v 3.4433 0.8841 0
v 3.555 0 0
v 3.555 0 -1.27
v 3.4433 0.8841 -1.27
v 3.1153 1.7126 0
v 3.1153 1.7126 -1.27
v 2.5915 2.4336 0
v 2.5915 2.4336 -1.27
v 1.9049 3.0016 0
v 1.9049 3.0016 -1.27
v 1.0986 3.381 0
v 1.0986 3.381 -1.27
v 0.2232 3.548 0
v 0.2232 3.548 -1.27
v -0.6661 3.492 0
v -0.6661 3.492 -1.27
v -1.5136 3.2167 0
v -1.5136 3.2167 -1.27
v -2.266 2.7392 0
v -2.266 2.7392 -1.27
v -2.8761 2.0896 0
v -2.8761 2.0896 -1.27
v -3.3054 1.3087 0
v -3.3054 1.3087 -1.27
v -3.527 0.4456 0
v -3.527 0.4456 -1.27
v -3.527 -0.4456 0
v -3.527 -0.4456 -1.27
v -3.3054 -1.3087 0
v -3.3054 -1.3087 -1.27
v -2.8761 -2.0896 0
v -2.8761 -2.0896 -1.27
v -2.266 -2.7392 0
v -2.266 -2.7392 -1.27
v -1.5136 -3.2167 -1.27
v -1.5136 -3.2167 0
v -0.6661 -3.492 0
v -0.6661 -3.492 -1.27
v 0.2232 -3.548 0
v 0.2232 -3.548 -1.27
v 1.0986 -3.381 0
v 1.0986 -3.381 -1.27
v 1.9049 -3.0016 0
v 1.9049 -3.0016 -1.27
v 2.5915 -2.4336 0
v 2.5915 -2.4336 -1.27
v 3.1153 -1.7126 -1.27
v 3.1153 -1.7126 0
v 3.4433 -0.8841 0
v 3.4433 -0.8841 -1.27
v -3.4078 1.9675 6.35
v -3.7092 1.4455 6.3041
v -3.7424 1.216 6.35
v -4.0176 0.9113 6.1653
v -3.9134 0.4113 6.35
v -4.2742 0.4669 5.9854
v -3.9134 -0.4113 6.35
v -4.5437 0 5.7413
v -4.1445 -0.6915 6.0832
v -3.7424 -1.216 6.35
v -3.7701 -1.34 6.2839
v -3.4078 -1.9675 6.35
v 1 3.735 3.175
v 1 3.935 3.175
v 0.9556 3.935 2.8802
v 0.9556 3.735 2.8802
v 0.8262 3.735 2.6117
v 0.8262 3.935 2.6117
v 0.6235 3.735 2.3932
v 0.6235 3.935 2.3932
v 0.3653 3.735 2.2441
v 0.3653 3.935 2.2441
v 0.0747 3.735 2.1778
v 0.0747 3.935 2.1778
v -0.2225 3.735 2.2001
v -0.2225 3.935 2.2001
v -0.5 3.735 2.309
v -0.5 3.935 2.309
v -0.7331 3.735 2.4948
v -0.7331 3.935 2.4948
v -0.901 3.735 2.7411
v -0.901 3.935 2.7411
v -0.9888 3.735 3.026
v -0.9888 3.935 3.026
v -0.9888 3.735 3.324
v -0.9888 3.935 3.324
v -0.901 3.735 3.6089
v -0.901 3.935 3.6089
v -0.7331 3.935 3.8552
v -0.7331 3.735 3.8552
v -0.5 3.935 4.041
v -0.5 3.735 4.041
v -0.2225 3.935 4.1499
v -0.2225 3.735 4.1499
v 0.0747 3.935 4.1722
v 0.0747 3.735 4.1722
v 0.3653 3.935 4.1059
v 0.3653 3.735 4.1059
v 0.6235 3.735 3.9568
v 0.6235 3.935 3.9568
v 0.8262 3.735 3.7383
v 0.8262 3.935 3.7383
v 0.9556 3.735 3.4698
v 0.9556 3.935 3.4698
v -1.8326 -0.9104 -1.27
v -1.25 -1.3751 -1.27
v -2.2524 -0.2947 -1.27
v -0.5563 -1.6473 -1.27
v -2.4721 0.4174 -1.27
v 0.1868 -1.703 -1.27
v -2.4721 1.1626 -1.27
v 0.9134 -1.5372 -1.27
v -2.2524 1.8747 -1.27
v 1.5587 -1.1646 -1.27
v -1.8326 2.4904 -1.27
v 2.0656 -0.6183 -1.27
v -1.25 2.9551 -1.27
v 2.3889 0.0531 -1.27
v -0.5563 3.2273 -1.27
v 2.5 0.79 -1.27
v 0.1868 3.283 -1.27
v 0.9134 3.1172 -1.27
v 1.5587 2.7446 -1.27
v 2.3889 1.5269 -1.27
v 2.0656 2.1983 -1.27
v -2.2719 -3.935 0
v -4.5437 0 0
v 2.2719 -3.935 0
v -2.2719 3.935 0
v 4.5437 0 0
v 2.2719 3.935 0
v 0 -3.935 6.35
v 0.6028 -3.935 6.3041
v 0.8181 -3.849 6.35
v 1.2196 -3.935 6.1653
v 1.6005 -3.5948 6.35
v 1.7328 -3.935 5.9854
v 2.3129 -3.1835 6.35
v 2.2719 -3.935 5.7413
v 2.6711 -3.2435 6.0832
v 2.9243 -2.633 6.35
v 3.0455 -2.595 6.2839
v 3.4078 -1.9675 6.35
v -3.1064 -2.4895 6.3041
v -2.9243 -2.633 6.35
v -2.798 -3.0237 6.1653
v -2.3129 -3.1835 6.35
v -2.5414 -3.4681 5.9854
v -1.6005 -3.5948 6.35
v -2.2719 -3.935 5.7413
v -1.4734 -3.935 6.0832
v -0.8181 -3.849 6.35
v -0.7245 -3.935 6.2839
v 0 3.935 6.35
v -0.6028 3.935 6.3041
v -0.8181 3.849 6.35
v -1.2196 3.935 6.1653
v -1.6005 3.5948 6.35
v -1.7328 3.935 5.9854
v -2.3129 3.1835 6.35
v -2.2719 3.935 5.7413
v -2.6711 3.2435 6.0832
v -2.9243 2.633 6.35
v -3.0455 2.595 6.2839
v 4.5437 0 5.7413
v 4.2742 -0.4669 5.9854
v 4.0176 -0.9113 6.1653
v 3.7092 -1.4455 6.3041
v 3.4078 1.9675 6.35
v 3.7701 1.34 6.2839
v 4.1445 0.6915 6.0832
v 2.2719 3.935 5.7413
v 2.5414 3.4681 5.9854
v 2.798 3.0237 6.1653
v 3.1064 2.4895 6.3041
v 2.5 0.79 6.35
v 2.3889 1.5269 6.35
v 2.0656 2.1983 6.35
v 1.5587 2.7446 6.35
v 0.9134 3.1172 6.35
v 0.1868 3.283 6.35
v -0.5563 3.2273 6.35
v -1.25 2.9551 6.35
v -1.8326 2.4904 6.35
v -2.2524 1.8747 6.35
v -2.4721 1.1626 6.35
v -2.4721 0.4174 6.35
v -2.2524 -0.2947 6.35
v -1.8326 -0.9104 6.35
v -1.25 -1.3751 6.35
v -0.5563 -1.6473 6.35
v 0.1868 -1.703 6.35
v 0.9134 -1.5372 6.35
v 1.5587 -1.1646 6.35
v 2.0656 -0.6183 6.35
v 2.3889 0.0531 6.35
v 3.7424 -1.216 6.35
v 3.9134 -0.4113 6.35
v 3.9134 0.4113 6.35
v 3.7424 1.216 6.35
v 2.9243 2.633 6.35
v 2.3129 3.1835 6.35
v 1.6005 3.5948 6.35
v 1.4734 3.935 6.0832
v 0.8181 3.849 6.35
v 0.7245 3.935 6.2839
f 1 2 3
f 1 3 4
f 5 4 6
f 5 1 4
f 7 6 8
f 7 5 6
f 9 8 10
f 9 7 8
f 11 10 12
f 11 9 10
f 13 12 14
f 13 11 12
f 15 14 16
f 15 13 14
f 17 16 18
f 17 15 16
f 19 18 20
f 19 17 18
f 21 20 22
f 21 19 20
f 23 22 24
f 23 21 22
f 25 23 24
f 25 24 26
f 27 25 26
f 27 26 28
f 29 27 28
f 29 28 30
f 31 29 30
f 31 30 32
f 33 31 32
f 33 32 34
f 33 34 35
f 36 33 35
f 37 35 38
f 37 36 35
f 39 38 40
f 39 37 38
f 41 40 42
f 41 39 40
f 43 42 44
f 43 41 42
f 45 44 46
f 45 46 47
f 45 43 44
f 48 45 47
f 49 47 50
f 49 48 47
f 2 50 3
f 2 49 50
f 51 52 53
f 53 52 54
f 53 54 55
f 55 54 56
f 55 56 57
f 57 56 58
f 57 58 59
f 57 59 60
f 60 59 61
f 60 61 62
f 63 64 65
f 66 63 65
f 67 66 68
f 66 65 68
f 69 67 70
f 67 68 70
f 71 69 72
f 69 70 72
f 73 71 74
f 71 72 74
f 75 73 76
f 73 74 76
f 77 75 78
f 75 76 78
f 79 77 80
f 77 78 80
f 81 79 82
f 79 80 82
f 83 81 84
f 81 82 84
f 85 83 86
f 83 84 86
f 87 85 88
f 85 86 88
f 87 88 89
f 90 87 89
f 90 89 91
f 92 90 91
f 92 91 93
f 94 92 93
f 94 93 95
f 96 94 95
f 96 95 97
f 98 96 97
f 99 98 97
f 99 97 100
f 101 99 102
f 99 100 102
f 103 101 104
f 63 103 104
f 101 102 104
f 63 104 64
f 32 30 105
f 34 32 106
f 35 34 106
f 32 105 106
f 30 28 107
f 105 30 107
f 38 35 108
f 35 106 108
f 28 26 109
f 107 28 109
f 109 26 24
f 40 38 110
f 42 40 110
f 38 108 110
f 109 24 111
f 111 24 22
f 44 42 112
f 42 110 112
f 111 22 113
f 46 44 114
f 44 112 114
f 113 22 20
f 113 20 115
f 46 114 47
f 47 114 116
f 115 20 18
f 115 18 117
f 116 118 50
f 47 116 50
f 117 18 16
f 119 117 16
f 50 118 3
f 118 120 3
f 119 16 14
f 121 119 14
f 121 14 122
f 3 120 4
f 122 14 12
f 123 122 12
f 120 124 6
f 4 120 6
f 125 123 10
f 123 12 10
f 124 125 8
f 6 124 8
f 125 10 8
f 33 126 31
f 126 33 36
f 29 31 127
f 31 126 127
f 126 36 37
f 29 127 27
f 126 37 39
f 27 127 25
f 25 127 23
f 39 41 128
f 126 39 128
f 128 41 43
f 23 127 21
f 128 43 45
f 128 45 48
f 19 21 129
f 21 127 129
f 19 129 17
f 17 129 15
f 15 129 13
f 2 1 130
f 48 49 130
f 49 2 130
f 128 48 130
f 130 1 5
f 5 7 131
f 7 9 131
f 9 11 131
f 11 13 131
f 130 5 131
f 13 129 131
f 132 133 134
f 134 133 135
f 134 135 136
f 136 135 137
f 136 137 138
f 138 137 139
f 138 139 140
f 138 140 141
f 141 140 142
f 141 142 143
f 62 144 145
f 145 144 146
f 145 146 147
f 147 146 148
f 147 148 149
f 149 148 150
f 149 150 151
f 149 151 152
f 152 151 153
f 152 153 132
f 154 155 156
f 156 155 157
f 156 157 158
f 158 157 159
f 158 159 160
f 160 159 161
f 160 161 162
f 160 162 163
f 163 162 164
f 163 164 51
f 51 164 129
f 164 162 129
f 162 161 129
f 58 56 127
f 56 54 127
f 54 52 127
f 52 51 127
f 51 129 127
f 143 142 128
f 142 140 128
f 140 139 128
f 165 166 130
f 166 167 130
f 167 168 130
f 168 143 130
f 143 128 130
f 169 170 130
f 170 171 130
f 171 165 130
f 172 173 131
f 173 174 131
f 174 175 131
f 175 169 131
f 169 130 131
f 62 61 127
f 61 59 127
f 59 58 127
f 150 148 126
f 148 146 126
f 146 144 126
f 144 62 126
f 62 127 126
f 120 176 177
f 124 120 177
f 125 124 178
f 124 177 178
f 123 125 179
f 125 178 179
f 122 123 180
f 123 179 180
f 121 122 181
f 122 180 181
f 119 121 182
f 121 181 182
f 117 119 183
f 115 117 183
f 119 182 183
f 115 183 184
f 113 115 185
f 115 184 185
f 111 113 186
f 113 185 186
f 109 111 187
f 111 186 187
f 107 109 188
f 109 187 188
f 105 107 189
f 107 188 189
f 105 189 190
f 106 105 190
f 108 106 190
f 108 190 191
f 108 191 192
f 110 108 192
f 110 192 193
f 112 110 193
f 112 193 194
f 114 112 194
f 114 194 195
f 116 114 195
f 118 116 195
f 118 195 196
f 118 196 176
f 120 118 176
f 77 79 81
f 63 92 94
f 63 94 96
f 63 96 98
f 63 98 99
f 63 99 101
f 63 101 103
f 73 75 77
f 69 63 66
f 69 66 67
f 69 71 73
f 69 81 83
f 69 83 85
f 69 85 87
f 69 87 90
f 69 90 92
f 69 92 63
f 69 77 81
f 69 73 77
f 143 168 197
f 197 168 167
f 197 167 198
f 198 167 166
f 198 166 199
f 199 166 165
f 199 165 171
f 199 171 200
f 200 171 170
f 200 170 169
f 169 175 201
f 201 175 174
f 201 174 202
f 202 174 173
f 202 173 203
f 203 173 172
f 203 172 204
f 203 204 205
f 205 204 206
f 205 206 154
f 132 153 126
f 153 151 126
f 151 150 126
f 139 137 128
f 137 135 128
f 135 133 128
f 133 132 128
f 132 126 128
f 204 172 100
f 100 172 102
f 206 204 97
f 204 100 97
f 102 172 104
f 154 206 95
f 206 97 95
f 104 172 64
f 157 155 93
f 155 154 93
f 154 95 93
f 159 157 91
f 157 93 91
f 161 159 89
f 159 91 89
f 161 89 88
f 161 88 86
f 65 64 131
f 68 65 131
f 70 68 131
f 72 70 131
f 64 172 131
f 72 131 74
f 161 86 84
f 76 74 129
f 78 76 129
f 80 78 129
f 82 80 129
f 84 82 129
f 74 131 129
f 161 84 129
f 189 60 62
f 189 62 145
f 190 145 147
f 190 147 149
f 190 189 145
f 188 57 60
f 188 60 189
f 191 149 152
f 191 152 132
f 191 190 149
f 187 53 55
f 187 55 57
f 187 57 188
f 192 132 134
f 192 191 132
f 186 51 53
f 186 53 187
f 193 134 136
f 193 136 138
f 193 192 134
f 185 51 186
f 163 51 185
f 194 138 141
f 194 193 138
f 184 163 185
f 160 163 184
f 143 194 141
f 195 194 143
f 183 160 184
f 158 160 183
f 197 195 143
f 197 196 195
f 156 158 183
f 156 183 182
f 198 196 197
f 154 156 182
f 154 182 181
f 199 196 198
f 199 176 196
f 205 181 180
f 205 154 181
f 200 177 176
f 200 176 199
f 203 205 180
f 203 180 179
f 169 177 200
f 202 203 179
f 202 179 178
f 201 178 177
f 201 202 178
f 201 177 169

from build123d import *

# Parameters (mm, degrees)
SKETCH1_R      = 3.555
EXTRUDE1_DEPTH = 1.27
ICE1_DEPTH     = 6.35
SKETCH3_R      = 2.5
ICE2_DEPTH     = 8.62
SKETCH4_R      = 1
ICE3_DEPTH     = 0.2


with BuildPart() as part:
    # Sketch1 → Extrude1 (new body)
    with BuildSketch(Plane.XY):
        Circle(SKETCH1_R)
    extrude(amount=-EXTRUDE1_DEPTH)

    # Sketch2 → ICE1 (add)
    with BuildSketch(Plane.XY):
        Polygon((4.543746619, 0), (2.271873309, 3.935), (-2.271873309, 3.935), (-4.543746619, 0), (-2.271873309, -3.935), (2.271873309, -3.935), align=None)
    extrude(amount=ICE1_DEPTH)

    # Sketch3 → ICE2 (cut, through all)
    with BuildSketch(Plane.XY.offset(6.35)):
        with Locations((0, 0.79)):
            Circle(SKETCH3_R)
    extrude(amount=-ICE2_DEPTH, mode=Mode.SUBTRACT)

    # Sketch4 → ICE3 (cut)
    with BuildSketch(Plane(origin=(0, 3.935, 0), x_dir=(1, 0, 0), z_dir=(0, 1, 0))):
        with Locations((0, -3.175)):
            Circle(SKETCH4_R)
    extrude(amount=-ICE3_DEPTH, mode=Mode.SUBTRACT)

    # Sketch5 → RevCut1 (revolve, cut)
    with BuildSketch(Plane(origin=(0, 0, 0), x_dir=(-0.866025404, -0.5, 0), z_dir=(-0.5, 0.866025404, 0))):
        Polygon((-3.935, 6.35), (-10.285, 0), (-10.285, 6.35), align=None)
    revolve(axis=Axis((0, 0, 0), (0, 0, 1)), mode=Mode.SUBTRACT)


solid = part.part
